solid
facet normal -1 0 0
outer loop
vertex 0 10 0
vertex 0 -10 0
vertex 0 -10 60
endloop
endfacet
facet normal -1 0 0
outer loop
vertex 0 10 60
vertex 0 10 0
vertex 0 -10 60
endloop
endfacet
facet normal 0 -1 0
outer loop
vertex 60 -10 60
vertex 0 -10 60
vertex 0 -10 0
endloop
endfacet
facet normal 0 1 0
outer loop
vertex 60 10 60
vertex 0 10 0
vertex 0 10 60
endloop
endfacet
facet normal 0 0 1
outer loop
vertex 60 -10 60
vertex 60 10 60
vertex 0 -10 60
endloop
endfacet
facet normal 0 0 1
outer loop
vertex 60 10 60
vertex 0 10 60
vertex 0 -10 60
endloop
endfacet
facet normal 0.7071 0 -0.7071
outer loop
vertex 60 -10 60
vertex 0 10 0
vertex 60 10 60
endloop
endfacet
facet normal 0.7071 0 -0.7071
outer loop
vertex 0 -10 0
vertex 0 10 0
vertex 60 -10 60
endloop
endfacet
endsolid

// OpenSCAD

dx=0;
dy=0;
dz=0;

// ignore variable values
x0=10;
y0=10;
z0=10;
sx=(dx+x0)/x0;
sy=(dy+y0)/y0;
sz=(dz+z0)/z0;

echo(version());
cube_size = 20; // [10:Small,20:Medium,30:Large]

hole_diameter = 2.5;
hole_radius = hole_diameter/2;

// How deep should the center hole be?
hole_depth = 1; // [0,1,5,50]

show_wheels = "yes"; // [yes,no]

// How thick should the side wheels be?
wheel_thickness = 1; // [1:20]

// ignore this variable!
// foo=1;

// don't turn functions into params!
function BEZ03(u) = pow((1-u), 3);

// ignore variable values
bing = 3+4;
baz = 3 / hole_depth;

module triangle(scale) {polyhedron(points = [[0, -10, 60], [0, 10, 60], [0, 10, 0], [0, -10, 0], [60, -10, 60], [60, 10, 60]], 
triangles = [[0,3,2], [0,2,1], [3,0,4], [1,2,5], [0,5,4], [0,1,5],  [5,2,4], [4,2,3], ]);}

//resize(newsize=[X,Y,Z]) triangle(1);
scale([sx,sy,sz]) triangle(1);

